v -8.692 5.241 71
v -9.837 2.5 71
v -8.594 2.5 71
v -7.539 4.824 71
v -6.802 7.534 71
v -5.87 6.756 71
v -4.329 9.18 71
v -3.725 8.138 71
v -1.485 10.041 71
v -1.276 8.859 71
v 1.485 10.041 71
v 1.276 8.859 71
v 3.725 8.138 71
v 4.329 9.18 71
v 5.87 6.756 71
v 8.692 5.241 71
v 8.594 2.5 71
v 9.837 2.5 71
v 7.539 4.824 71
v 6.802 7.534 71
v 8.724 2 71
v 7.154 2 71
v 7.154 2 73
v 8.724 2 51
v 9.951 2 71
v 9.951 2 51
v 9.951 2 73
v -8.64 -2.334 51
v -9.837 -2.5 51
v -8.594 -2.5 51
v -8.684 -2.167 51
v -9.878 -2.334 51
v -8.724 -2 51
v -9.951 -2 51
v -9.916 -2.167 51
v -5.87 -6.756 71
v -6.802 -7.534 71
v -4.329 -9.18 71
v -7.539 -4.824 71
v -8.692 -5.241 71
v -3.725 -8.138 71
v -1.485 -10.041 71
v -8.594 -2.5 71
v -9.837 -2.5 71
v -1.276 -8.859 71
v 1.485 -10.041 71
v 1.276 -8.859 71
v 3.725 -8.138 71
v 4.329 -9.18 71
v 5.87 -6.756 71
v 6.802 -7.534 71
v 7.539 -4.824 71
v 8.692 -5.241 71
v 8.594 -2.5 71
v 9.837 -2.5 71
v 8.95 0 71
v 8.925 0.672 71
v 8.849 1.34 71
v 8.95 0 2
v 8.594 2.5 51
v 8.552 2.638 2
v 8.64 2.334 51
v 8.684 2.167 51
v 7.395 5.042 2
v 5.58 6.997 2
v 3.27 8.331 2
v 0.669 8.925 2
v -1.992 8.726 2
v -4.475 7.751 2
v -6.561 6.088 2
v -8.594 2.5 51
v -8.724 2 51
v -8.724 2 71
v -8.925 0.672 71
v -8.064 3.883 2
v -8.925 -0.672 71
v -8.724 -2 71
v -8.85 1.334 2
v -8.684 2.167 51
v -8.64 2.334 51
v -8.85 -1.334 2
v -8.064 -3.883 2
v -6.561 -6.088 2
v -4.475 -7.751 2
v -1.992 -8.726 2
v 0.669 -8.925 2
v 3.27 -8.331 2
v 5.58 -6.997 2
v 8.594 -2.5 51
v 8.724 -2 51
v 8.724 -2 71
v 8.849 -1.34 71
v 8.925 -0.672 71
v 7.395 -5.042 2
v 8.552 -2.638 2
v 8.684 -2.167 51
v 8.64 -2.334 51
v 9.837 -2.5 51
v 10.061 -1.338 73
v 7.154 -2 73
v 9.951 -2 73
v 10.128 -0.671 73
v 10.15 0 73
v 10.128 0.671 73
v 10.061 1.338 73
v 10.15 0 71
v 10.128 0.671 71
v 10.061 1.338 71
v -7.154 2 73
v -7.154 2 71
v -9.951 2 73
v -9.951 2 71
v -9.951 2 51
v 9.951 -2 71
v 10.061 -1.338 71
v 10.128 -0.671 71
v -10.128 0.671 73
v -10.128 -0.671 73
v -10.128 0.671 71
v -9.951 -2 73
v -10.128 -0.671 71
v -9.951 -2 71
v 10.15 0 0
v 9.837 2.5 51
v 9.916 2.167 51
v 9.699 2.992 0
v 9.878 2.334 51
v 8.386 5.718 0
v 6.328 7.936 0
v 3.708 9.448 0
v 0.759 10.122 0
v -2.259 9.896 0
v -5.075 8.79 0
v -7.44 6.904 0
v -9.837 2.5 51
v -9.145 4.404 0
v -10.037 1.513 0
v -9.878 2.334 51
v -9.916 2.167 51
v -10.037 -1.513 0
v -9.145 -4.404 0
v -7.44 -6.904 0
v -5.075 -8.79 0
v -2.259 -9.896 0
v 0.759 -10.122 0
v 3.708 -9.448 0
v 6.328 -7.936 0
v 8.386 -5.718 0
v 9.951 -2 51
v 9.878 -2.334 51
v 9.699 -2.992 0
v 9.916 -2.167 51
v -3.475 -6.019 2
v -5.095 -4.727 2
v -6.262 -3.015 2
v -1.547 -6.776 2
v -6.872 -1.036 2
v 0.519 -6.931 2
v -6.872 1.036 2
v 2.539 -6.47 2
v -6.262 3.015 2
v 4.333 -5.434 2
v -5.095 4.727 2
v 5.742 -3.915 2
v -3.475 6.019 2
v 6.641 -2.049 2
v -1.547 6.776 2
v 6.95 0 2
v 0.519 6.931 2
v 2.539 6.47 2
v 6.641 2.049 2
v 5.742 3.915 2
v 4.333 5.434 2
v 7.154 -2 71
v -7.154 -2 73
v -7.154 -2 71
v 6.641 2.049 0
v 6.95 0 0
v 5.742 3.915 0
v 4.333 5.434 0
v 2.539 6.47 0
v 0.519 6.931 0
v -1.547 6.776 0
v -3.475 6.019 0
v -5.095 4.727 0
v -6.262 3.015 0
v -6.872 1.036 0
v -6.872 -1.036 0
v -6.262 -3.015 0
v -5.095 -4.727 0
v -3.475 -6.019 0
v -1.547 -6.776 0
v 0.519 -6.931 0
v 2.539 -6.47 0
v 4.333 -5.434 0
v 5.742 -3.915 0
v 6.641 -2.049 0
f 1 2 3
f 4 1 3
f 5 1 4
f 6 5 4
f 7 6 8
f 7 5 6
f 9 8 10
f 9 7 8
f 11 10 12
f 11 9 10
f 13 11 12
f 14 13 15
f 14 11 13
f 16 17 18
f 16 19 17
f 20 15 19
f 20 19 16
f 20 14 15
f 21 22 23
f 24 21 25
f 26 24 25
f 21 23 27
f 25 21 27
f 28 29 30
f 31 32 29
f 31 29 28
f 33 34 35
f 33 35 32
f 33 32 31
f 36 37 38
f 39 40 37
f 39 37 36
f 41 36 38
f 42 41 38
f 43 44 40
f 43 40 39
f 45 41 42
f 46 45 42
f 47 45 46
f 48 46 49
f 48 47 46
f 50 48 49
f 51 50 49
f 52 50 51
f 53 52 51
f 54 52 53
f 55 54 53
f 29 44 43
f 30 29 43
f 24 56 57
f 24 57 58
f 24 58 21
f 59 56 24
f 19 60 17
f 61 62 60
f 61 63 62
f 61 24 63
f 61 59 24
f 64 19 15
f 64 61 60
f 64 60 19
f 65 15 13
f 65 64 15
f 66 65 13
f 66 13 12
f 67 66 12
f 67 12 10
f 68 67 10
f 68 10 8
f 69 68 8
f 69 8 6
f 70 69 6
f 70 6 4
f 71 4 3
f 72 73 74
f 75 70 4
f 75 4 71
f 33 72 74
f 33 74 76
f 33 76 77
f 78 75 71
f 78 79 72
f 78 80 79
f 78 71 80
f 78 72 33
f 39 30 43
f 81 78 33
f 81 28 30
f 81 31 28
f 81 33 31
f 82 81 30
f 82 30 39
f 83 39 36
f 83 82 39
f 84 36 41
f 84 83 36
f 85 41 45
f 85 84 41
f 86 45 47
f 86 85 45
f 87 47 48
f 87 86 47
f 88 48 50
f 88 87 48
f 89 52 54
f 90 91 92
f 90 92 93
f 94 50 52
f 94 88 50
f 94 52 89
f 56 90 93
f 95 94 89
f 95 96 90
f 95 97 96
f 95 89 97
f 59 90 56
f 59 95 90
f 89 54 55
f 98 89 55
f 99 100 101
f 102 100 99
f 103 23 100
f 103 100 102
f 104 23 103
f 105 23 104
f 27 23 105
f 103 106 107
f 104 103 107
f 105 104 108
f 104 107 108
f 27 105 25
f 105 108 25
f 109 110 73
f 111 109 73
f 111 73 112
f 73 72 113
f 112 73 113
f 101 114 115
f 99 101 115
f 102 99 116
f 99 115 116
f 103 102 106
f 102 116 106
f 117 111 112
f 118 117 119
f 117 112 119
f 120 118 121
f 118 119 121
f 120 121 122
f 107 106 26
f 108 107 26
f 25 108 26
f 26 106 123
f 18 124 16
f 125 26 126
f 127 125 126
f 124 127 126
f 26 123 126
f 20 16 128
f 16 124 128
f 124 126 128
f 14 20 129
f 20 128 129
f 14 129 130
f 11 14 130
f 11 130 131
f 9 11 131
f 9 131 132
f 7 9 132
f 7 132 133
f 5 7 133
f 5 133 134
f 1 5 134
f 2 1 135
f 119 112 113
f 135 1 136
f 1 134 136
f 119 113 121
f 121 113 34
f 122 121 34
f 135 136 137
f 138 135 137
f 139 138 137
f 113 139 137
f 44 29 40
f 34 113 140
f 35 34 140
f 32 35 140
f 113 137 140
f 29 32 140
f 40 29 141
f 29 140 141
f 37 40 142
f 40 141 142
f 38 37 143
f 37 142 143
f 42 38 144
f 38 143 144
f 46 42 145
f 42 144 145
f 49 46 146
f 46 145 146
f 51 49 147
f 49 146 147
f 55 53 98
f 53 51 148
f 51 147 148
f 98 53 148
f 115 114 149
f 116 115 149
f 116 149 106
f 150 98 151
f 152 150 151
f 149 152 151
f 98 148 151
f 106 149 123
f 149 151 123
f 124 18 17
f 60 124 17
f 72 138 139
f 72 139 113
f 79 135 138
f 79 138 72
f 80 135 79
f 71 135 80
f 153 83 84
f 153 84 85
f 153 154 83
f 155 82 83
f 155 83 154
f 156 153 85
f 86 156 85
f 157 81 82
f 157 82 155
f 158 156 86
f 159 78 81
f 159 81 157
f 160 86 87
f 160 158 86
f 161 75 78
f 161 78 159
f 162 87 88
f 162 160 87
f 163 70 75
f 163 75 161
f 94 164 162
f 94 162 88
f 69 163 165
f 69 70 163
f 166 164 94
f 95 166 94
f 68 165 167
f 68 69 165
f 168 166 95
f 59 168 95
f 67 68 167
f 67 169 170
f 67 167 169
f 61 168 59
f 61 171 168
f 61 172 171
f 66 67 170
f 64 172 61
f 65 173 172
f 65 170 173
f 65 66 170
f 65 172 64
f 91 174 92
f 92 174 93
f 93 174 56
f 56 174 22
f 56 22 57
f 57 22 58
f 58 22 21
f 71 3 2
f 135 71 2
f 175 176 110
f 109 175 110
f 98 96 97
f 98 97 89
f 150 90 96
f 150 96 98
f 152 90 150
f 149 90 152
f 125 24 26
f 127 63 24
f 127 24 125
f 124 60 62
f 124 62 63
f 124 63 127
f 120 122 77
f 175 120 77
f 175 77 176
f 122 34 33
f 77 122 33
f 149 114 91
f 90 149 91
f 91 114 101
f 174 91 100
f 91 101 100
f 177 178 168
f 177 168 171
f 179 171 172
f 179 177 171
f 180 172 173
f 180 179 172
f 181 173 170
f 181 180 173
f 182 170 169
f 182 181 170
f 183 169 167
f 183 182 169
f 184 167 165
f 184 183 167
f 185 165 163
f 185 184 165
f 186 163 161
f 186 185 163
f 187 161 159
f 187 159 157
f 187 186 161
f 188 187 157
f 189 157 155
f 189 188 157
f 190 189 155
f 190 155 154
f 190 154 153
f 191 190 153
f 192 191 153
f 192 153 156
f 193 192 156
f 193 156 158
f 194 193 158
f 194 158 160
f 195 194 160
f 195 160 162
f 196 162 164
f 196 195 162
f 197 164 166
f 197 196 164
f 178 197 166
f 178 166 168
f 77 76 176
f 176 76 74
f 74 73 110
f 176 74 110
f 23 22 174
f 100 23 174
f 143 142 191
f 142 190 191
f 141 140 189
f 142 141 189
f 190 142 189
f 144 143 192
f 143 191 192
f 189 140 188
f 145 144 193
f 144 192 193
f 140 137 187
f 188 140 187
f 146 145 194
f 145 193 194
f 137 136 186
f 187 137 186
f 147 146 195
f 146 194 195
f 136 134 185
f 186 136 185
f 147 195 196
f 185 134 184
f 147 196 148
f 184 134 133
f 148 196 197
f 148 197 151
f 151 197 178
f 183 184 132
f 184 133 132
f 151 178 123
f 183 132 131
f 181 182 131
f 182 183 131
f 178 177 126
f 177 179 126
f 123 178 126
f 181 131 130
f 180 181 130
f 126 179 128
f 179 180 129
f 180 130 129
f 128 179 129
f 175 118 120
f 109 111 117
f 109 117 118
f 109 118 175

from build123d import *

# Parameters (mm, degrees)
F0_R     = 10.15
F0_R_2   = 8.95
F1_DEPTH = 71
F0_R_3   = 6.95
F2_DEPTH = 2
F4_DEPTH = 20
F5_DEPTH = 2


with BuildPart() as f1:
    # F0 (on Top) → F1 (new body)
    with BuildSketch(Plane.XY):
        Circle(F0_R)
        Circle(F0_R_2, mode=Mode.SUBTRACT)
    extrude(amount=F1_DEPTH)

    # F0 (on Top) → F2 (join)
    with BuildSketch(Plane.XY):
        Circle(F0_R_2)
        Circle(F0_R_3, mode=Mode.SUBTRACT)
    extrude(amount=F2_DEPTH)

    # F3 (on face) → F4 (cut)
    with BuildSketch(Plane.XY.offset(71)):
        with BuildLine():
            Line((-8.5937477273, 2.5), (-9.8373014592, 2.5))
            ThreePointArc((-9.8373014592, 2.5), (-9.8973111438, 2.2507181348), (-9.9510049744, 2))
            Line((-9.9510049744, 2), (-8.7236746844, 2))
            ThreePointArc((-8.7236746844, 2), (-8.6623195362, 2.2509376388), (-8.5937477273, 2.5))
        make_face()
        with BuildLine():
            ThreePointArc((-9.9510049744, -2), (-9.8973111438, -2.2507181348), (-9.8373014592, -2.5))
            Line((-9.8373014592, -2.5), (-8.5937477273, -2.5))
            ThreePointArc((-8.5937477273, -2.5), (-8.6623195362, -2.2509376388), (-8.7236746844, -2))
            Line((-8.7236746844, -2), (-9.9510049744, -2))
        make_face()
        with BuildLine():
            Line((8.7236746844, 2), (9.9510049744, 2))
            ThreePointArc((9.9510049744, 2), (9.8973111438, 2.2507181348), (9.8373014592, 2.5))
            Line((9.8373014592, 2.5), (8.5937477273, 2.5))
            ThreePointArc((8.5937477273, 2.5), (8.6623195362, 2.2509376388), (8.7236746844, 2))
        make_face()
        with BuildLine():
            ThreePointArc((9.8373014592, -2.5), (9.8973111438, -2.2507181348), (9.9510049744, -2))
            Line((9.9510049744, -2), (8.7236746844, -2))
            ThreePointArc((8.7236746844, -2), (8.6623195362, -2.2509376388), (8.5937477273, -2.5))
            Line((8.5937477273, -2.5), (9.8373014592, -2.5))
        make_face()
    extrude(amount=-F4_DEPTH, mode=Mode.SUBTRACT)

    # F3 (on face) → F5 (join)
    with BuildSketch(Plane.XY.offset(71)):
        with BuildLine():
            Line((-7.1543120913, 2), (-8.7236746844, 2))
            ThreePointArc((-8.7236746844, 2), (-8.95, 0), (-8.7236746844, -2))
            Line((-8.7236746844, -2), (-7.1543120913, -2))
            Line((-7.1543120913, -2), (-7.1543120913, 2))
        make_face()
        with BuildLine():
            Line((-8.7236746844, 2), (-9.9510049744, 2))
            ThreePointArc((-9.9510049744, 2), (-10.15, 0), (-9.9510049744, -2))
            Line((-9.9510049744, -2), (-8.7236746844, -2))
            ThreePointArc((-8.7236746844, -2), (-8.95, 0), (-8.7236746844, 2))
        make_face()
        with BuildLine():
            ThreePointArc((8.95, 0), (8.8932386796, 1.0063825252), (8.7236746844, 2))
            Line((8.7236746844, 2), (7.1543120913, 2))
            Line((7.1543120913, 2), (7.1543120913, -2))
            Line((7.1543120913, -2), (8.7236746844, -2))
            ThreePointArc((8.7236746844, -2), (8.8932386796, -1.0063825252), (8.95, 0))
        make_face()
        with BuildLine():
            ThreePointArc((9.9510049744, -2), (10.1001287242, -1.0049376872), (10.15, 0))
            ThreePointArc((10.15, 0), (10.1001287242, 1.0049376872), (9.9510049744, 2))
            Line((9.9510049744, 2), (8.7236746844, 2))
            ThreePointArc((8.7236746844, 2), (8.8932386796, 1.0063825252), (8.95, 0))
            ThreePointArc((8.95, 0), (8.8932386796, -1.0063825252), (8.7236746844, -2))
            Line((8.7236746844, -2), (9.9510049744, -2))
        make_face()
    extrude(amount=F5_DEPTH)


solid = f1.part
